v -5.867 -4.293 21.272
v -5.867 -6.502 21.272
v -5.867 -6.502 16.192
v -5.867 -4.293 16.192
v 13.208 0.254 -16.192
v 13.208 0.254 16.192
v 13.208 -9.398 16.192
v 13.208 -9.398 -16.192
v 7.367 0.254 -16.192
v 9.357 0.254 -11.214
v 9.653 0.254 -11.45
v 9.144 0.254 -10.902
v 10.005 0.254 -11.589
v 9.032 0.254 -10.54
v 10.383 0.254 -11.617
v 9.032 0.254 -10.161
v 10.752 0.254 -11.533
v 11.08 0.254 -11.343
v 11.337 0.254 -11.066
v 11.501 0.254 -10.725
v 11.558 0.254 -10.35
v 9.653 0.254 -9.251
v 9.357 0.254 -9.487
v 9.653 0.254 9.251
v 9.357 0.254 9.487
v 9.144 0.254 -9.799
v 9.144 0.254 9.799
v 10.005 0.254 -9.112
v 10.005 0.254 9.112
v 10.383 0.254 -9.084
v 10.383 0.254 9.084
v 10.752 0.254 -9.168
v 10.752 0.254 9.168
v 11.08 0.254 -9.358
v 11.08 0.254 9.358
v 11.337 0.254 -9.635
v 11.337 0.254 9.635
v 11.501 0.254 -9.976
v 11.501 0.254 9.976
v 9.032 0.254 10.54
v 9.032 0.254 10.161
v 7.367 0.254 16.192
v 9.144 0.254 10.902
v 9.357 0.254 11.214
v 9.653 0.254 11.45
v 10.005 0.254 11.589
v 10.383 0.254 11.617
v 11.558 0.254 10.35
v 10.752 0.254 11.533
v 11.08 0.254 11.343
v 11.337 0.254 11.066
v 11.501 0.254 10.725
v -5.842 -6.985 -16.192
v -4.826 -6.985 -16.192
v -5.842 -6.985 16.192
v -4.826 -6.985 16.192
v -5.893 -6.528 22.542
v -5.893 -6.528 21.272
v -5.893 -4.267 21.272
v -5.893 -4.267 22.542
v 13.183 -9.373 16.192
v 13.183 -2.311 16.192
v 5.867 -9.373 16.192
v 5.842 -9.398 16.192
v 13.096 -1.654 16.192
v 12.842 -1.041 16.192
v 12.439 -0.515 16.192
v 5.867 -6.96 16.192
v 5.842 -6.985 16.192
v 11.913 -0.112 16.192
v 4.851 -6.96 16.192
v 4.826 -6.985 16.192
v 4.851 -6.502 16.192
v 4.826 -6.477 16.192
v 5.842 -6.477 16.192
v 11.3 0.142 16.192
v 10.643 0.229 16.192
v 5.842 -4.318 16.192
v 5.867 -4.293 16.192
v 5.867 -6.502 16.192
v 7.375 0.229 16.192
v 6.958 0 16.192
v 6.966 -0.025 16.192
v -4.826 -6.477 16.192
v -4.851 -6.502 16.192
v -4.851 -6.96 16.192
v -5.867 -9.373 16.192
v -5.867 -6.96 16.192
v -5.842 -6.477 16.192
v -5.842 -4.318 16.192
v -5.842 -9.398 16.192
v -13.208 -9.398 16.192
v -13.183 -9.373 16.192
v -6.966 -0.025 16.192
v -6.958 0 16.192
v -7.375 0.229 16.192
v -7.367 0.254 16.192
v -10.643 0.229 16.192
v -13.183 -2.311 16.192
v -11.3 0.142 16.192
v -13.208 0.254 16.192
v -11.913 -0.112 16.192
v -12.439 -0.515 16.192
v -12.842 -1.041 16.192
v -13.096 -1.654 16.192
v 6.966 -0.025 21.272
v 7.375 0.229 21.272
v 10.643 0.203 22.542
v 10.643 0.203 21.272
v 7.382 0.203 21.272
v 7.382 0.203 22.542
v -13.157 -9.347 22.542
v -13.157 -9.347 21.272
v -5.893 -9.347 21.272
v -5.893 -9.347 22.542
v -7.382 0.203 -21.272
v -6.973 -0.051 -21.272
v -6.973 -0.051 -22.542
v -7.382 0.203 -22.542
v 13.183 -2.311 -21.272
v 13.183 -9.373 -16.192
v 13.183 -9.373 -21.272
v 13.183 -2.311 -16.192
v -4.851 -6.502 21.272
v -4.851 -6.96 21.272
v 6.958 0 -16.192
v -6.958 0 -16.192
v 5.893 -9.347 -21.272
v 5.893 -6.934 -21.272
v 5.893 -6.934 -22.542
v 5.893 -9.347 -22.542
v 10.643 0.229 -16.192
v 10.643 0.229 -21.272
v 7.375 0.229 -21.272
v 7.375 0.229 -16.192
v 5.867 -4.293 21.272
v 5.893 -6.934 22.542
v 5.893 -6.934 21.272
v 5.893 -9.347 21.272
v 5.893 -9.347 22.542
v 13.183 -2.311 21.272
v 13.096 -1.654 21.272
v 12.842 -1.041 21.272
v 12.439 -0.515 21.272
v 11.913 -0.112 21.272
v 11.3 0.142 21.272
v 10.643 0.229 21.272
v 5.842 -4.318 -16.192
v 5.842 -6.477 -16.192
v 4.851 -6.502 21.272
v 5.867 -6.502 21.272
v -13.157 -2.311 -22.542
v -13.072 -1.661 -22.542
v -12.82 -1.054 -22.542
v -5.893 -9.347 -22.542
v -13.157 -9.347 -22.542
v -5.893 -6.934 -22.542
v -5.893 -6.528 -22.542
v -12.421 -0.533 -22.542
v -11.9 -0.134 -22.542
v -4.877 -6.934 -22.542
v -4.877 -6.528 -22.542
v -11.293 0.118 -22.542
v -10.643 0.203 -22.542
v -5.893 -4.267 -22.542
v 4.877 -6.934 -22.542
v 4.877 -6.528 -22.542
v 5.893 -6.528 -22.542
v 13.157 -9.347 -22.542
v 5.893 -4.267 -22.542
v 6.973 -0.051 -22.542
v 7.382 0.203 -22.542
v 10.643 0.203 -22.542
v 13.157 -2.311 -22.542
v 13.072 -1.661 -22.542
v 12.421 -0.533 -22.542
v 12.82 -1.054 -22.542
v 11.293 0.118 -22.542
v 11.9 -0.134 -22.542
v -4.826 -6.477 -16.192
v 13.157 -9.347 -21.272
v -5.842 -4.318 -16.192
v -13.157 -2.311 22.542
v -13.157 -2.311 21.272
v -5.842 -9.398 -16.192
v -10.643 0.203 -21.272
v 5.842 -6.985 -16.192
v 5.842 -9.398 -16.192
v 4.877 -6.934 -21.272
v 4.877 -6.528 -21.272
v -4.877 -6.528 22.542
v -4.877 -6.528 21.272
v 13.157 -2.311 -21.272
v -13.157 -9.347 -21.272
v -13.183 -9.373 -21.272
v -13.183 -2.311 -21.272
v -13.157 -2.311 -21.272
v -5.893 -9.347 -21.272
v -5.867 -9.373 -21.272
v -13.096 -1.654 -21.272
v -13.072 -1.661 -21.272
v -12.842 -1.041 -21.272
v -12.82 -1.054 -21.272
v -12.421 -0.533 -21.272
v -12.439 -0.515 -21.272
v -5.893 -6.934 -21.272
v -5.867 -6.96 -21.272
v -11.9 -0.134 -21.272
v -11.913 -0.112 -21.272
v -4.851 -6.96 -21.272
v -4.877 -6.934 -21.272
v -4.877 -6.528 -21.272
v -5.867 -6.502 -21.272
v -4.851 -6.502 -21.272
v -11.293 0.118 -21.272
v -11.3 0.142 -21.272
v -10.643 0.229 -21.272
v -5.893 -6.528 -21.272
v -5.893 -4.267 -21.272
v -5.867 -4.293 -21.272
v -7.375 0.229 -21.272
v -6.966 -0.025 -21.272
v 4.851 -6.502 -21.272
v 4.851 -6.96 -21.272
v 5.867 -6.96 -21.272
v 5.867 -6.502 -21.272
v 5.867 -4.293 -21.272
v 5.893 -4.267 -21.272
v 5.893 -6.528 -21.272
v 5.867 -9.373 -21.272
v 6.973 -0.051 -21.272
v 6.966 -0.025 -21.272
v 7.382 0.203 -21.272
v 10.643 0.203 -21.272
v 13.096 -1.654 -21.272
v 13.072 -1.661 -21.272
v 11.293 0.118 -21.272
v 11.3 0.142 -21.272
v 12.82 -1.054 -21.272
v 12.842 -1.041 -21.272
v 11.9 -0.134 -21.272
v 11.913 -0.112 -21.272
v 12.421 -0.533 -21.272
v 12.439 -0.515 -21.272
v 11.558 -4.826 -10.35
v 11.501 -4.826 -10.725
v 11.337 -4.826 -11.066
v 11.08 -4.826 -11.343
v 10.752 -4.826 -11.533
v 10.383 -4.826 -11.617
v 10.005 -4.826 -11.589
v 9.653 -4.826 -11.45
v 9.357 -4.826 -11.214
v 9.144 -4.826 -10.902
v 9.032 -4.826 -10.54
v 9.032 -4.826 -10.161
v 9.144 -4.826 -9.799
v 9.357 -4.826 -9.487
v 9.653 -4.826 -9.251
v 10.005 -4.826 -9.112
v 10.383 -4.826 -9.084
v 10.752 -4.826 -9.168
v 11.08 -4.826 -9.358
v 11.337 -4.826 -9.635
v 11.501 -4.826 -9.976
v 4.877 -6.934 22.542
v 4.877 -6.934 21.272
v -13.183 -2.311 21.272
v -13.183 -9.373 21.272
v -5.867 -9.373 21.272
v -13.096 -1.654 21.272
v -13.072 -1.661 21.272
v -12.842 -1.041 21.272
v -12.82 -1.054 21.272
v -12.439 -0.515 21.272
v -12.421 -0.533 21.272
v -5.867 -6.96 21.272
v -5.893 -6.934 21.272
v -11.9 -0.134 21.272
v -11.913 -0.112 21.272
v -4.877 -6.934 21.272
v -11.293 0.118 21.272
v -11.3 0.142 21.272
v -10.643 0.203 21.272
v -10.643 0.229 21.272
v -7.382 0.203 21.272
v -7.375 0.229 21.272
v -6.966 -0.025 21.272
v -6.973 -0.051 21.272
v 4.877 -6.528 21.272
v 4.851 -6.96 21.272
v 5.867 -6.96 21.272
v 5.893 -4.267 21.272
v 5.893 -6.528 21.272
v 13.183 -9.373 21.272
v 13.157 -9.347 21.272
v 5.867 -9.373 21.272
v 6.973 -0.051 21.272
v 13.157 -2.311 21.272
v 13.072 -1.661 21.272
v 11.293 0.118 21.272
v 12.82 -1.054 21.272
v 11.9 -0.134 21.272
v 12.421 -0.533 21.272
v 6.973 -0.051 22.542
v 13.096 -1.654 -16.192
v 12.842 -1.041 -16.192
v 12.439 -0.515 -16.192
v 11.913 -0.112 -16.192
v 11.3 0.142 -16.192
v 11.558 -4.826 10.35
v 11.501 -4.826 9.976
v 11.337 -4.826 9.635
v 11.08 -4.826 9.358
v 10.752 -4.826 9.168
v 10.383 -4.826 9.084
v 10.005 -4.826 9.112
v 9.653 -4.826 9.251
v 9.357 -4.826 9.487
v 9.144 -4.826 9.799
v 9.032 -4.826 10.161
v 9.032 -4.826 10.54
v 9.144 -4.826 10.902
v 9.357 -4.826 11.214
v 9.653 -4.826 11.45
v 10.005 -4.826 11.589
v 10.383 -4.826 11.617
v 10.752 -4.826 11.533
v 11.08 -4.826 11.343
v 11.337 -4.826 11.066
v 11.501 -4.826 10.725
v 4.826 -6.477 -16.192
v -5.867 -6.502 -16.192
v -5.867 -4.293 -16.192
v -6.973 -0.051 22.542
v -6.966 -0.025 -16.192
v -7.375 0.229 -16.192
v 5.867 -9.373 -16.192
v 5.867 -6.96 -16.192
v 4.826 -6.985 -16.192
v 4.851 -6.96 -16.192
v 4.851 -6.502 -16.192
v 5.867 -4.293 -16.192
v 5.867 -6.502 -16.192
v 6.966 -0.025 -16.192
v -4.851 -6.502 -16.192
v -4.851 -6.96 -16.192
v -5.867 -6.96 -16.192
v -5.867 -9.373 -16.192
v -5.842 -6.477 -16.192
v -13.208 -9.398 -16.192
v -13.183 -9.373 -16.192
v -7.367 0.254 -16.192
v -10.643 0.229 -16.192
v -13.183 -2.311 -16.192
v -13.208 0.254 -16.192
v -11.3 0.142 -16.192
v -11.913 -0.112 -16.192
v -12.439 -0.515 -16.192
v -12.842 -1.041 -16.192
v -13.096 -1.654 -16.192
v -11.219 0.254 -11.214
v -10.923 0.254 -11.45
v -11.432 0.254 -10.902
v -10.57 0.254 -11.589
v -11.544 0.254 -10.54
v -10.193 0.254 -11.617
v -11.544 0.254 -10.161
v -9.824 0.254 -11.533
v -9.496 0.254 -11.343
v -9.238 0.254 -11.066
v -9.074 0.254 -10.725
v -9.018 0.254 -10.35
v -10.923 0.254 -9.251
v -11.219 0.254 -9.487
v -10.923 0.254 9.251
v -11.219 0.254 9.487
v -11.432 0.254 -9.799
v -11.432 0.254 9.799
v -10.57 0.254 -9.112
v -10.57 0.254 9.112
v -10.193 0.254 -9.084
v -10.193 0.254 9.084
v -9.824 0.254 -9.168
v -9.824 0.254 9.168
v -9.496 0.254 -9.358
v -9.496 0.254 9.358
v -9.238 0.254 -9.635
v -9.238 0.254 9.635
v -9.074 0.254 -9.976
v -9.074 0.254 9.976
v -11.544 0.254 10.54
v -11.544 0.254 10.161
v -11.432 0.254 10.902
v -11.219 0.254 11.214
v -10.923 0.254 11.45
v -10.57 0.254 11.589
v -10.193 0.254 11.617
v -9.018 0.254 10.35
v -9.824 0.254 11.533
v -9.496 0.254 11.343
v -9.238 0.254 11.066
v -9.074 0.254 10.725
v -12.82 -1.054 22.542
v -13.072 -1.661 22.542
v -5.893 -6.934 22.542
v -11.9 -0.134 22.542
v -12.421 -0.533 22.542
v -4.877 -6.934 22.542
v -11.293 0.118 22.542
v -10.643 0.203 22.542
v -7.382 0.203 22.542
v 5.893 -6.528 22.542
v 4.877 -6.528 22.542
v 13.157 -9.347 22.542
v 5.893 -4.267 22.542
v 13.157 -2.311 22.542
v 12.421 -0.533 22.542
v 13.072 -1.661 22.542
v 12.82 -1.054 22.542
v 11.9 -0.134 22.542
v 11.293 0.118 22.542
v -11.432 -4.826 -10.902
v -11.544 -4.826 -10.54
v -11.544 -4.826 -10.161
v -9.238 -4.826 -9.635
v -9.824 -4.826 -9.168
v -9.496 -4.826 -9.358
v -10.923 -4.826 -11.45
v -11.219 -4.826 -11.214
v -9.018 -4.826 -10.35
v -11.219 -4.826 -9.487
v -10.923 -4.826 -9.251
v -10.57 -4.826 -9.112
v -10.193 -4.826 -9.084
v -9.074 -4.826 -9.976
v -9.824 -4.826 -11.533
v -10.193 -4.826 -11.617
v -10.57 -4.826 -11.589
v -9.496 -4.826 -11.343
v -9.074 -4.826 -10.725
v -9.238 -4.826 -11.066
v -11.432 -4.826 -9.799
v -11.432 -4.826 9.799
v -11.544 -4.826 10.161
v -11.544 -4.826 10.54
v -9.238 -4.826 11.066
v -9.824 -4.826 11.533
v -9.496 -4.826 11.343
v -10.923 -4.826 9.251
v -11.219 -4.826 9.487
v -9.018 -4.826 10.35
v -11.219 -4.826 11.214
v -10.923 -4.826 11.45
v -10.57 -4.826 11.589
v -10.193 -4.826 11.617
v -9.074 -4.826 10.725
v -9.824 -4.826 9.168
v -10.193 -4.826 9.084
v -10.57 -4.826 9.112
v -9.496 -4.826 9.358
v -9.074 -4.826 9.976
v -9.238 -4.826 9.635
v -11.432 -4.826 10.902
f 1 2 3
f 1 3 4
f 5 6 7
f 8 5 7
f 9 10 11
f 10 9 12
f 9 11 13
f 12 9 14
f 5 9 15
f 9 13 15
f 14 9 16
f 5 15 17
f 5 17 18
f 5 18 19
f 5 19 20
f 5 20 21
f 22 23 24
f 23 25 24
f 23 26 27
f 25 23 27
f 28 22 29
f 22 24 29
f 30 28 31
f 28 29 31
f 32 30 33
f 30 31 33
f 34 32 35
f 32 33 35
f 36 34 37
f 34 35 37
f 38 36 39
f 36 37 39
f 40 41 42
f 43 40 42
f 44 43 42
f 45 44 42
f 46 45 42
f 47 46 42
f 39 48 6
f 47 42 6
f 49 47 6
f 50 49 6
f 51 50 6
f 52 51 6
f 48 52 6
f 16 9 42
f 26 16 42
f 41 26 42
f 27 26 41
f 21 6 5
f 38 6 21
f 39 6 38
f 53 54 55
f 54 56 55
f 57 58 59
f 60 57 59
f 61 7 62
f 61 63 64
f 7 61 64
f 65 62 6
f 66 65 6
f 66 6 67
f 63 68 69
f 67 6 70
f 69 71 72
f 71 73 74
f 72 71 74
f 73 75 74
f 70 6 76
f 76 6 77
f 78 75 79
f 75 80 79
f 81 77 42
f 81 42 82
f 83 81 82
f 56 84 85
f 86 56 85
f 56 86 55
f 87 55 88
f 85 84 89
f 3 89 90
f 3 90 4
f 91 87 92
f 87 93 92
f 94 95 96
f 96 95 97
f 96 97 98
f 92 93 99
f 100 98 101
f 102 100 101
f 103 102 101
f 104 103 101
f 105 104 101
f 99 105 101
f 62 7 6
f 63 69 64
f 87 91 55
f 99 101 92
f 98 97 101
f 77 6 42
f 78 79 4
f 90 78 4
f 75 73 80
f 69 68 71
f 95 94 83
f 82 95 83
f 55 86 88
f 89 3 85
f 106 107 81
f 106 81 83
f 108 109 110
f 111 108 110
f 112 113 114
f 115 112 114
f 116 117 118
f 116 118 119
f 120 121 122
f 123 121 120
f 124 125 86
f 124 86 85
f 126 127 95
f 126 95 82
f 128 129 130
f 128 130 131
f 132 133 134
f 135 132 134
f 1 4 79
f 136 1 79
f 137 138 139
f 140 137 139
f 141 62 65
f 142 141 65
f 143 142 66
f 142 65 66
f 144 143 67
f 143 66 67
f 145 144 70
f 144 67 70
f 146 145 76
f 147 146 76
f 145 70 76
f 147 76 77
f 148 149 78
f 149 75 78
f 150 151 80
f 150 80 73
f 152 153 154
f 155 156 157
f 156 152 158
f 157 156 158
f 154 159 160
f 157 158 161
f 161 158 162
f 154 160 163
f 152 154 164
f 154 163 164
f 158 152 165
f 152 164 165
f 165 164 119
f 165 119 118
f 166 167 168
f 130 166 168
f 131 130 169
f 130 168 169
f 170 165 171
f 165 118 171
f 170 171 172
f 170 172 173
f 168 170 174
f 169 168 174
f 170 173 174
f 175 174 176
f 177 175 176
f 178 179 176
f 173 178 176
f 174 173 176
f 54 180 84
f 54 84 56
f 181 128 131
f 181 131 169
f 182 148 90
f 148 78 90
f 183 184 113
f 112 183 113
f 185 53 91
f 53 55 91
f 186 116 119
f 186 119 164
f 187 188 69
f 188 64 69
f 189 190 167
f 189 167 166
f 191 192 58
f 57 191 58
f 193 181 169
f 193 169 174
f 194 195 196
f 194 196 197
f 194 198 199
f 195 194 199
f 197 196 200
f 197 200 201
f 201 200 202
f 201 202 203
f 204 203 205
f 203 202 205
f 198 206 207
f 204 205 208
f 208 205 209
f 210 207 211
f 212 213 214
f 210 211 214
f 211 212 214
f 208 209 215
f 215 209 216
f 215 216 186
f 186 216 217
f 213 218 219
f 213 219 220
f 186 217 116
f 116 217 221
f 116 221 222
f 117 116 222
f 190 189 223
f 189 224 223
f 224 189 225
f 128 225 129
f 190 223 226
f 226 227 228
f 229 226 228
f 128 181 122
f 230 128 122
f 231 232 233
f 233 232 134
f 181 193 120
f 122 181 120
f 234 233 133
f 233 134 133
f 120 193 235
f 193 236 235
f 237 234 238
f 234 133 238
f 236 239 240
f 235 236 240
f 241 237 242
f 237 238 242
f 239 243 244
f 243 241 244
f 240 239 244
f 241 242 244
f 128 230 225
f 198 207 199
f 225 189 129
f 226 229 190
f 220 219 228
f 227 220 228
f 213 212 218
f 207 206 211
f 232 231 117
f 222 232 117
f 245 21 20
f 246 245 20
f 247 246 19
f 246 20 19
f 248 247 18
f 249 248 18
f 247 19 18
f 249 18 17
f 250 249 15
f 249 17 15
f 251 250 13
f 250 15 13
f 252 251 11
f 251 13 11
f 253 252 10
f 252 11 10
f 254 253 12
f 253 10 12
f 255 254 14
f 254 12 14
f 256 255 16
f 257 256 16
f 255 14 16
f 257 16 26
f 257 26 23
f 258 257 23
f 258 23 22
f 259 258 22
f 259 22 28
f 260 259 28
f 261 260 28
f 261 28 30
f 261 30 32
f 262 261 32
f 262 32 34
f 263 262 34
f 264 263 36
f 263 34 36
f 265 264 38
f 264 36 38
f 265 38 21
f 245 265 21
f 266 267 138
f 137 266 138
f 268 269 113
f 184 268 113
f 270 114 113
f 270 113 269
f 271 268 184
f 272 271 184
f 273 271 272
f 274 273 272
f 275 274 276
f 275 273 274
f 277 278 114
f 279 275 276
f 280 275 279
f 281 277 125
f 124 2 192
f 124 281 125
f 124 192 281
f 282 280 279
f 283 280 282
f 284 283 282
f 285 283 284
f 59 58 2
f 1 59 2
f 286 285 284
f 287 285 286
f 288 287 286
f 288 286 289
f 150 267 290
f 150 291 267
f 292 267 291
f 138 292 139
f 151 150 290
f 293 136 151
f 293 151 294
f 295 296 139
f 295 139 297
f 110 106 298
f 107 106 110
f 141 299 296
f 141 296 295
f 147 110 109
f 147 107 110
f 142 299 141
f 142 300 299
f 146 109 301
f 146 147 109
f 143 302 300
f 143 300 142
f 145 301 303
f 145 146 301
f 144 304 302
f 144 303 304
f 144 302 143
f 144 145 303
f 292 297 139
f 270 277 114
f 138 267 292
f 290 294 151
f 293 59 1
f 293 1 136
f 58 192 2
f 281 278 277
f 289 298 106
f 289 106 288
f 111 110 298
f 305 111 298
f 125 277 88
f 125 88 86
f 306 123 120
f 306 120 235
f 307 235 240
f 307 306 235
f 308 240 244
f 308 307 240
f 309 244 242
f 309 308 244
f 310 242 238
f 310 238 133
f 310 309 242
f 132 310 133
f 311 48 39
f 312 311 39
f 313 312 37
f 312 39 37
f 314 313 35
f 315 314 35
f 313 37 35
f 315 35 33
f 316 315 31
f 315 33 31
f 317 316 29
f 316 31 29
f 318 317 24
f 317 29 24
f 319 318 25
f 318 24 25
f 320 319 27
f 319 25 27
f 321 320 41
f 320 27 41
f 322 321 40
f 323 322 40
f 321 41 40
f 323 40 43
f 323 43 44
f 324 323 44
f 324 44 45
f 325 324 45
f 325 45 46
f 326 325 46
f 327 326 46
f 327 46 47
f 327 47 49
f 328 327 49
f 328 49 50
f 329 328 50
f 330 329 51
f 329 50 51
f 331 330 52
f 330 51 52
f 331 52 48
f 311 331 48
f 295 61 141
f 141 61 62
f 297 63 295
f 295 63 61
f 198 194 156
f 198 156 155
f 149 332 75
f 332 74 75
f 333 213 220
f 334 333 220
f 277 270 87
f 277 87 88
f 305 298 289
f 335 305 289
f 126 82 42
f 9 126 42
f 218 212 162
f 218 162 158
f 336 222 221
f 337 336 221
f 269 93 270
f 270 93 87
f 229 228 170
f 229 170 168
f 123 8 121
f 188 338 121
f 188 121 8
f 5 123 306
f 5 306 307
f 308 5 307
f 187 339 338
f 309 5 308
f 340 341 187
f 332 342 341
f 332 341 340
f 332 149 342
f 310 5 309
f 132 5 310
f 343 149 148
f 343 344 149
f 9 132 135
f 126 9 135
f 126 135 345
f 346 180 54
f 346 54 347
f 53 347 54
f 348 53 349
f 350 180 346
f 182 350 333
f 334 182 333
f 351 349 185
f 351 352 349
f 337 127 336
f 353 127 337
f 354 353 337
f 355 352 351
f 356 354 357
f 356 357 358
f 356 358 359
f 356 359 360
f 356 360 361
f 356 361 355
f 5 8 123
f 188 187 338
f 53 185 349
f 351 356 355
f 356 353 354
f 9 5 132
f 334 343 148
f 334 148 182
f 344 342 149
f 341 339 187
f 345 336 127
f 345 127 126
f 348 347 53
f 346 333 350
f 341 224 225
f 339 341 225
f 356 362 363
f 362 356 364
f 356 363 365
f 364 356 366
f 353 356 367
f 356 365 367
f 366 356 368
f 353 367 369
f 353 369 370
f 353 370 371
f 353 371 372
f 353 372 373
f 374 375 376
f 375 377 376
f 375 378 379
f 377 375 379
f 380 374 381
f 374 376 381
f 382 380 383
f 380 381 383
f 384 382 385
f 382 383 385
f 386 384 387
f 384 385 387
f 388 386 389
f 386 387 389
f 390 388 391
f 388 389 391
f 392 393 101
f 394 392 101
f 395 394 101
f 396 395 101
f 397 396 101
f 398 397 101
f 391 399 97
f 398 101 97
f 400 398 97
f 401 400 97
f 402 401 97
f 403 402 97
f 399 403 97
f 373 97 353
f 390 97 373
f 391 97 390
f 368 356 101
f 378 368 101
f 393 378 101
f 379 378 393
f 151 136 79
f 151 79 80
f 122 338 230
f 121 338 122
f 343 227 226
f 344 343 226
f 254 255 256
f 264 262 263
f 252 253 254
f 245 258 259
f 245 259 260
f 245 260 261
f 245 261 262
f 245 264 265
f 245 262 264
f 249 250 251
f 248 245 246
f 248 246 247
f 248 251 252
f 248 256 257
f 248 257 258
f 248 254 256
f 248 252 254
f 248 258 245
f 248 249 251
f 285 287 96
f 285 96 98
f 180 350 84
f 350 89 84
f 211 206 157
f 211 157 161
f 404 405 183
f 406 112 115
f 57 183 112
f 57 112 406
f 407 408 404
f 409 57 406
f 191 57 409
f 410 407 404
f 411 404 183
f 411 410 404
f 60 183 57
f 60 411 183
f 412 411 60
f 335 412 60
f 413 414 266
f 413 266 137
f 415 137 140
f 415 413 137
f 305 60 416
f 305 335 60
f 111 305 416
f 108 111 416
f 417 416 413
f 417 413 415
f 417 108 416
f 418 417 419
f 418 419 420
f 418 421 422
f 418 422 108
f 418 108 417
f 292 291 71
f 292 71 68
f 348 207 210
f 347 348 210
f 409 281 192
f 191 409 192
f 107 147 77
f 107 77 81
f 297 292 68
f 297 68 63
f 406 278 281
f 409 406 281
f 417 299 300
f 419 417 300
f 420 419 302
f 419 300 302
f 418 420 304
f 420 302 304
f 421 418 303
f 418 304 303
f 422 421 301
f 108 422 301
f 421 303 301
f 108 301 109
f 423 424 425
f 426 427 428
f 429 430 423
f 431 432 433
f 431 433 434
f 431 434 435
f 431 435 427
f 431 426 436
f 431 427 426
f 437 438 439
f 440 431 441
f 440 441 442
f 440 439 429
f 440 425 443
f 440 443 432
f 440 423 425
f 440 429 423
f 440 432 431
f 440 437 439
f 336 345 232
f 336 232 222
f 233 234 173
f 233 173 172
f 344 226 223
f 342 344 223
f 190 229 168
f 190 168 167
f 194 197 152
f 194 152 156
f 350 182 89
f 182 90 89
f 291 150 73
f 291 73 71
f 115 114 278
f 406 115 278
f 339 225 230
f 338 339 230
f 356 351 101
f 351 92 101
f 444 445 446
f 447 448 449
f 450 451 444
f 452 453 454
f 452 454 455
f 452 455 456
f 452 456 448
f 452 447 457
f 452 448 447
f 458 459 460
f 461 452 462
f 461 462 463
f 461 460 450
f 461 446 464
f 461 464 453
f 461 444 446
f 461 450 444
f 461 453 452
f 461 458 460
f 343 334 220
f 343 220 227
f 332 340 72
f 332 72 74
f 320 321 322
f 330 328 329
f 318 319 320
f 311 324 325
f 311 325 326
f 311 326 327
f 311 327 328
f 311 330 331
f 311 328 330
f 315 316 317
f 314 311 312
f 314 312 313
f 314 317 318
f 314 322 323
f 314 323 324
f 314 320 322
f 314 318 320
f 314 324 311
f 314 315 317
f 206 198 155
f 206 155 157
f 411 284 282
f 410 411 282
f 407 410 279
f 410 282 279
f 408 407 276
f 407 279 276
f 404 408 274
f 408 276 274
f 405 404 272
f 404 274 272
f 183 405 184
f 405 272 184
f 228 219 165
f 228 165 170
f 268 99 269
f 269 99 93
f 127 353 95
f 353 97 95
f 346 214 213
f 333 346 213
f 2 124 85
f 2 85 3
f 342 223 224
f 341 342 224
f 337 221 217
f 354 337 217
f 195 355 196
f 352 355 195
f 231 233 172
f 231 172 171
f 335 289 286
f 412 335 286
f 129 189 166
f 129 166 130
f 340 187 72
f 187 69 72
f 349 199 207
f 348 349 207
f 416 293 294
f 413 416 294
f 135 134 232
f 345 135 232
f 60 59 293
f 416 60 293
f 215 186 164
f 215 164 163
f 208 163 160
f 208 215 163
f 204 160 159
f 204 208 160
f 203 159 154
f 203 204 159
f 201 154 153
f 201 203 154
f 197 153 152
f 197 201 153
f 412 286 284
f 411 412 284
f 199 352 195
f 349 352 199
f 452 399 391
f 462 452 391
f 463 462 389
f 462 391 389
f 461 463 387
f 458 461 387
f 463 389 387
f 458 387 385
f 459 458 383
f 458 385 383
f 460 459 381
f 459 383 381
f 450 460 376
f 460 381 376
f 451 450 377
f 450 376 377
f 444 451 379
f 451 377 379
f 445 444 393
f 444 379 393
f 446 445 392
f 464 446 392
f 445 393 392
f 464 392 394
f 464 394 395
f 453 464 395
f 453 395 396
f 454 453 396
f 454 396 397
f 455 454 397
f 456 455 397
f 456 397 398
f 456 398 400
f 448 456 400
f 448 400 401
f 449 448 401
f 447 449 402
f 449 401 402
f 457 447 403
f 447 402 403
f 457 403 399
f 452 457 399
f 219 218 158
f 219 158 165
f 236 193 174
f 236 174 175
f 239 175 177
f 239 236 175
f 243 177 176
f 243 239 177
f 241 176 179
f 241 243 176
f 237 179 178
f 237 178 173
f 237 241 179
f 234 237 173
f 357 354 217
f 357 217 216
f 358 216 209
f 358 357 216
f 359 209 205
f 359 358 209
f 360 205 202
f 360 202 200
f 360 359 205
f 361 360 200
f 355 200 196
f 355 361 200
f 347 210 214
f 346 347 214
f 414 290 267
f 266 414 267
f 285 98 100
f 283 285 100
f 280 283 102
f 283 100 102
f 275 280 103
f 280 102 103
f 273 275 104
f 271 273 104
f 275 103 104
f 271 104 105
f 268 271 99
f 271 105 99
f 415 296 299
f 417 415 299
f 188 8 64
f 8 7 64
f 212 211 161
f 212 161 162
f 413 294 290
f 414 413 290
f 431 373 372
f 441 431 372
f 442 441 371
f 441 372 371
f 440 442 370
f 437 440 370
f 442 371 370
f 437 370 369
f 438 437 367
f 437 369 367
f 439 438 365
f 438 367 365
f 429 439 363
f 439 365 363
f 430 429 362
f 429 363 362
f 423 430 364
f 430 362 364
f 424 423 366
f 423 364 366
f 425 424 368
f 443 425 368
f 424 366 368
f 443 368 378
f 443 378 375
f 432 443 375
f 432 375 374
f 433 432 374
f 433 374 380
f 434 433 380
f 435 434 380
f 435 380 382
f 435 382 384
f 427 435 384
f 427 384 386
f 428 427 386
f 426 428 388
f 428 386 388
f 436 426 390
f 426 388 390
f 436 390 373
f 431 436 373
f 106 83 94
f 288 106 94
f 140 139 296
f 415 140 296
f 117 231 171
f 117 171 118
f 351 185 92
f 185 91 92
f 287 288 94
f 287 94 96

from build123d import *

# Parameters (mm, degrees)
BOSS_EXTRUDE1_DEPTH = 16.1925
SKETCH2_R           = 1.27
CUT_EXTRUDE1_DEPTH  = 5.08
BOSS_EXTRUDE2_DEPTH = 5.08
BOSS_EXTRUDE3_DEPTH = 1.27


with BuildPart() as part:
    # Sketch1 → Boss-Extrude1 (new body, symmetric)
    with BuildSketch(Plane.XY):
        Polygon((13.208, 0.254), (13.208, -9.398), (5.842, -9.398), (5.842, -6.985), (4.826, -6.985), (4.826, -6.477), (5.842, -6.477), (5.842, -4.318), (-5.842, -4.318), (-5.842, -6.477), (-4.826, -6.477), (-4.826, -6.985), (-5.842, -6.985), (-5.842, -9.398), (-13.208, -9.398), (-13.208, 0.254), (-7.367499011, 0.254), (-6.958302098, 0), (6.958302098, 0), (7.367499011, 0.254), align=None)
    extrude(amount=BOSS_EXTRUDE1_DEPTH, both=True)

    # Sketch2 → Cut-Extrude1 (cut)
    with BuildSketch(Plane(origin=(0, 0.254, 0), x_dir=(1, 0, 0), z_dir=(0, 1, 0))):
        with Locations((-10.287749506, 10.3505)):
            Circle(SKETCH2_R)
        with Locations((10.287749506, 10.3505)):
            Circle(SKETCH2_R)
        with Locations((10.287749506, -10.3505)):
            Circle(SKETCH2_R)
        with Locations((-10.287749506, -10.3505)):
            Circle(SKETCH2_R)
    extrude(amount=-CUT_EXTRUDE1_DEPTH, mode=Mode.SUBTRACT)

    # Sketch3 → Boss-Extrude2 (add)
    with BuildSketch(Plane.XY.offset(16.1925)):
        with BuildLine():
            Line((5.8674, -4.2926), (5.8674, -6.5024))
            Line((5.8674, -6.5024), (4.8514, -6.5024))
            Line((4.8514, -6.5024), (4.8514, -6.9596))
            Line((4.8514, -6.9596), (5.8674, -6.9596))
            Line((5.8674, -6.9596), (5.8674, -9.3726))
            Line((5.8674, -9.3726), (13.1826, -9.3726))
            Line((13.1826, -9.3726), (13.1826, -2.3114))
            ThreePointArc((13.1826, -2.3114), (12.438651224, -0.515348776), (10.6426, 0.2286))
            Line((10.6426, 0.2286), (7.37474135, 0.2286))
            Line((7.37474135, 0.2286), (6.965544437, -0.0254))
            Line((6.965544437, -0.0254), (-6.965544437, -0.0254))
            Line((-6.965544437, -0.0254), (-7.37474135, 0.2286))
            Line((-7.37474135, 0.2286), (-10.6426, 0.2286))
            ThreePointArc((-10.6426, 0.2286), (-12.438651224, -0.515348776), (-13.1826, -2.3114))
            Line((-13.1826, -2.3114), (-13.1826, -9.3726))
            Line((-13.1826, -9.3726), (-5.8674, -9.3726))
            Line((-5.8674, -9.3726), (-5.8674, -6.9596))
            Line((-5.8674, -6.9596), (-4.8514, -6.9596))
            Line((-4.8514, -6.9596), (-4.8514, -6.5024))
            Line((-4.8514, -6.5024), (-5.8674, -6.5024))
            Line((-5.8674, -6.5024), (-5.8674, -4.2926))
            Line((-5.8674, -4.2926), (5.8674, -4.2926))
        make_face()
    boss_extrude2 = extrude(amount=BOSS_EXTRUDE2_DEPTH)

    # Sketch5 → Boss-Extrude3 (add)
    with BuildSketch(Plane.XY.offset(21.2725)):
        with BuildLine():
            Line((13.1572, -9.3472), (13.1572, -2.3114))
            ThreePointArc((13.1572, -2.3114), (12.420690712, -0.533309288), (10.6426, 0.2032))
            Line((10.6426, 0.2032), (7.381983689, 0.2032))
            Line((7.381983689, 0.2032), (6.972786776, -0.0508))
            Line((6.972786776, -0.0508), (-6.972786776, -0.0508))
            Line((-6.972786776, -0.0508), (-7.381983689, 0.2032))
            Line((-7.381983689, 0.2032), (-10.6426, 0.2032))
            ThreePointArc((-10.6426, 0.2032), (-12.420690712, -0.533309288), (-13.1572, -2.3114))
            Line((-13.1572, -2.3114), (-13.1572, -9.3472))
            Line((-13.1572, -9.3472), (-5.8928, -9.3472))
            Line((-5.8928, -9.3472), (-5.8928, -6.9342))
            Line((-5.8928, -6.9342), (-4.8768, -6.9342))
            Line((-4.8768, -6.9342), (-4.8768, -6.5278))
            Line((-4.8768, -6.5278), (-5.8928, -6.5278))
            Line((-5.8928, -6.5278), (-5.8928, -4.2672))
            Line((-5.8928, -4.2672), (5.8928, -4.2672))
            Line((5.8928, -4.2672), (5.8928, -6.5278))
            Line((5.8928, -6.5278), (4.8768, -6.5278))
            Line((4.8768, -6.5278), (4.8768, -6.9342))
            Line((4.8768, -6.9342), (5.8928, -6.9342))
            Line((5.8928, -6.9342), (5.8928, -9.3472))
            Line((5.8928, -9.3472), (13.1572, -9.3472))
        make_face()
    boss_extrude3 = extrude(amount=BOSS_EXTRUDE3_DEPTH)

    # Mirror2: Boss-Extrude2, Boss-Extrude3 across plane
    add(boss_extrude2.mirror(Plane.XY))
    add(boss_extrude3.mirror(Plane.XY))


solid = part.part
